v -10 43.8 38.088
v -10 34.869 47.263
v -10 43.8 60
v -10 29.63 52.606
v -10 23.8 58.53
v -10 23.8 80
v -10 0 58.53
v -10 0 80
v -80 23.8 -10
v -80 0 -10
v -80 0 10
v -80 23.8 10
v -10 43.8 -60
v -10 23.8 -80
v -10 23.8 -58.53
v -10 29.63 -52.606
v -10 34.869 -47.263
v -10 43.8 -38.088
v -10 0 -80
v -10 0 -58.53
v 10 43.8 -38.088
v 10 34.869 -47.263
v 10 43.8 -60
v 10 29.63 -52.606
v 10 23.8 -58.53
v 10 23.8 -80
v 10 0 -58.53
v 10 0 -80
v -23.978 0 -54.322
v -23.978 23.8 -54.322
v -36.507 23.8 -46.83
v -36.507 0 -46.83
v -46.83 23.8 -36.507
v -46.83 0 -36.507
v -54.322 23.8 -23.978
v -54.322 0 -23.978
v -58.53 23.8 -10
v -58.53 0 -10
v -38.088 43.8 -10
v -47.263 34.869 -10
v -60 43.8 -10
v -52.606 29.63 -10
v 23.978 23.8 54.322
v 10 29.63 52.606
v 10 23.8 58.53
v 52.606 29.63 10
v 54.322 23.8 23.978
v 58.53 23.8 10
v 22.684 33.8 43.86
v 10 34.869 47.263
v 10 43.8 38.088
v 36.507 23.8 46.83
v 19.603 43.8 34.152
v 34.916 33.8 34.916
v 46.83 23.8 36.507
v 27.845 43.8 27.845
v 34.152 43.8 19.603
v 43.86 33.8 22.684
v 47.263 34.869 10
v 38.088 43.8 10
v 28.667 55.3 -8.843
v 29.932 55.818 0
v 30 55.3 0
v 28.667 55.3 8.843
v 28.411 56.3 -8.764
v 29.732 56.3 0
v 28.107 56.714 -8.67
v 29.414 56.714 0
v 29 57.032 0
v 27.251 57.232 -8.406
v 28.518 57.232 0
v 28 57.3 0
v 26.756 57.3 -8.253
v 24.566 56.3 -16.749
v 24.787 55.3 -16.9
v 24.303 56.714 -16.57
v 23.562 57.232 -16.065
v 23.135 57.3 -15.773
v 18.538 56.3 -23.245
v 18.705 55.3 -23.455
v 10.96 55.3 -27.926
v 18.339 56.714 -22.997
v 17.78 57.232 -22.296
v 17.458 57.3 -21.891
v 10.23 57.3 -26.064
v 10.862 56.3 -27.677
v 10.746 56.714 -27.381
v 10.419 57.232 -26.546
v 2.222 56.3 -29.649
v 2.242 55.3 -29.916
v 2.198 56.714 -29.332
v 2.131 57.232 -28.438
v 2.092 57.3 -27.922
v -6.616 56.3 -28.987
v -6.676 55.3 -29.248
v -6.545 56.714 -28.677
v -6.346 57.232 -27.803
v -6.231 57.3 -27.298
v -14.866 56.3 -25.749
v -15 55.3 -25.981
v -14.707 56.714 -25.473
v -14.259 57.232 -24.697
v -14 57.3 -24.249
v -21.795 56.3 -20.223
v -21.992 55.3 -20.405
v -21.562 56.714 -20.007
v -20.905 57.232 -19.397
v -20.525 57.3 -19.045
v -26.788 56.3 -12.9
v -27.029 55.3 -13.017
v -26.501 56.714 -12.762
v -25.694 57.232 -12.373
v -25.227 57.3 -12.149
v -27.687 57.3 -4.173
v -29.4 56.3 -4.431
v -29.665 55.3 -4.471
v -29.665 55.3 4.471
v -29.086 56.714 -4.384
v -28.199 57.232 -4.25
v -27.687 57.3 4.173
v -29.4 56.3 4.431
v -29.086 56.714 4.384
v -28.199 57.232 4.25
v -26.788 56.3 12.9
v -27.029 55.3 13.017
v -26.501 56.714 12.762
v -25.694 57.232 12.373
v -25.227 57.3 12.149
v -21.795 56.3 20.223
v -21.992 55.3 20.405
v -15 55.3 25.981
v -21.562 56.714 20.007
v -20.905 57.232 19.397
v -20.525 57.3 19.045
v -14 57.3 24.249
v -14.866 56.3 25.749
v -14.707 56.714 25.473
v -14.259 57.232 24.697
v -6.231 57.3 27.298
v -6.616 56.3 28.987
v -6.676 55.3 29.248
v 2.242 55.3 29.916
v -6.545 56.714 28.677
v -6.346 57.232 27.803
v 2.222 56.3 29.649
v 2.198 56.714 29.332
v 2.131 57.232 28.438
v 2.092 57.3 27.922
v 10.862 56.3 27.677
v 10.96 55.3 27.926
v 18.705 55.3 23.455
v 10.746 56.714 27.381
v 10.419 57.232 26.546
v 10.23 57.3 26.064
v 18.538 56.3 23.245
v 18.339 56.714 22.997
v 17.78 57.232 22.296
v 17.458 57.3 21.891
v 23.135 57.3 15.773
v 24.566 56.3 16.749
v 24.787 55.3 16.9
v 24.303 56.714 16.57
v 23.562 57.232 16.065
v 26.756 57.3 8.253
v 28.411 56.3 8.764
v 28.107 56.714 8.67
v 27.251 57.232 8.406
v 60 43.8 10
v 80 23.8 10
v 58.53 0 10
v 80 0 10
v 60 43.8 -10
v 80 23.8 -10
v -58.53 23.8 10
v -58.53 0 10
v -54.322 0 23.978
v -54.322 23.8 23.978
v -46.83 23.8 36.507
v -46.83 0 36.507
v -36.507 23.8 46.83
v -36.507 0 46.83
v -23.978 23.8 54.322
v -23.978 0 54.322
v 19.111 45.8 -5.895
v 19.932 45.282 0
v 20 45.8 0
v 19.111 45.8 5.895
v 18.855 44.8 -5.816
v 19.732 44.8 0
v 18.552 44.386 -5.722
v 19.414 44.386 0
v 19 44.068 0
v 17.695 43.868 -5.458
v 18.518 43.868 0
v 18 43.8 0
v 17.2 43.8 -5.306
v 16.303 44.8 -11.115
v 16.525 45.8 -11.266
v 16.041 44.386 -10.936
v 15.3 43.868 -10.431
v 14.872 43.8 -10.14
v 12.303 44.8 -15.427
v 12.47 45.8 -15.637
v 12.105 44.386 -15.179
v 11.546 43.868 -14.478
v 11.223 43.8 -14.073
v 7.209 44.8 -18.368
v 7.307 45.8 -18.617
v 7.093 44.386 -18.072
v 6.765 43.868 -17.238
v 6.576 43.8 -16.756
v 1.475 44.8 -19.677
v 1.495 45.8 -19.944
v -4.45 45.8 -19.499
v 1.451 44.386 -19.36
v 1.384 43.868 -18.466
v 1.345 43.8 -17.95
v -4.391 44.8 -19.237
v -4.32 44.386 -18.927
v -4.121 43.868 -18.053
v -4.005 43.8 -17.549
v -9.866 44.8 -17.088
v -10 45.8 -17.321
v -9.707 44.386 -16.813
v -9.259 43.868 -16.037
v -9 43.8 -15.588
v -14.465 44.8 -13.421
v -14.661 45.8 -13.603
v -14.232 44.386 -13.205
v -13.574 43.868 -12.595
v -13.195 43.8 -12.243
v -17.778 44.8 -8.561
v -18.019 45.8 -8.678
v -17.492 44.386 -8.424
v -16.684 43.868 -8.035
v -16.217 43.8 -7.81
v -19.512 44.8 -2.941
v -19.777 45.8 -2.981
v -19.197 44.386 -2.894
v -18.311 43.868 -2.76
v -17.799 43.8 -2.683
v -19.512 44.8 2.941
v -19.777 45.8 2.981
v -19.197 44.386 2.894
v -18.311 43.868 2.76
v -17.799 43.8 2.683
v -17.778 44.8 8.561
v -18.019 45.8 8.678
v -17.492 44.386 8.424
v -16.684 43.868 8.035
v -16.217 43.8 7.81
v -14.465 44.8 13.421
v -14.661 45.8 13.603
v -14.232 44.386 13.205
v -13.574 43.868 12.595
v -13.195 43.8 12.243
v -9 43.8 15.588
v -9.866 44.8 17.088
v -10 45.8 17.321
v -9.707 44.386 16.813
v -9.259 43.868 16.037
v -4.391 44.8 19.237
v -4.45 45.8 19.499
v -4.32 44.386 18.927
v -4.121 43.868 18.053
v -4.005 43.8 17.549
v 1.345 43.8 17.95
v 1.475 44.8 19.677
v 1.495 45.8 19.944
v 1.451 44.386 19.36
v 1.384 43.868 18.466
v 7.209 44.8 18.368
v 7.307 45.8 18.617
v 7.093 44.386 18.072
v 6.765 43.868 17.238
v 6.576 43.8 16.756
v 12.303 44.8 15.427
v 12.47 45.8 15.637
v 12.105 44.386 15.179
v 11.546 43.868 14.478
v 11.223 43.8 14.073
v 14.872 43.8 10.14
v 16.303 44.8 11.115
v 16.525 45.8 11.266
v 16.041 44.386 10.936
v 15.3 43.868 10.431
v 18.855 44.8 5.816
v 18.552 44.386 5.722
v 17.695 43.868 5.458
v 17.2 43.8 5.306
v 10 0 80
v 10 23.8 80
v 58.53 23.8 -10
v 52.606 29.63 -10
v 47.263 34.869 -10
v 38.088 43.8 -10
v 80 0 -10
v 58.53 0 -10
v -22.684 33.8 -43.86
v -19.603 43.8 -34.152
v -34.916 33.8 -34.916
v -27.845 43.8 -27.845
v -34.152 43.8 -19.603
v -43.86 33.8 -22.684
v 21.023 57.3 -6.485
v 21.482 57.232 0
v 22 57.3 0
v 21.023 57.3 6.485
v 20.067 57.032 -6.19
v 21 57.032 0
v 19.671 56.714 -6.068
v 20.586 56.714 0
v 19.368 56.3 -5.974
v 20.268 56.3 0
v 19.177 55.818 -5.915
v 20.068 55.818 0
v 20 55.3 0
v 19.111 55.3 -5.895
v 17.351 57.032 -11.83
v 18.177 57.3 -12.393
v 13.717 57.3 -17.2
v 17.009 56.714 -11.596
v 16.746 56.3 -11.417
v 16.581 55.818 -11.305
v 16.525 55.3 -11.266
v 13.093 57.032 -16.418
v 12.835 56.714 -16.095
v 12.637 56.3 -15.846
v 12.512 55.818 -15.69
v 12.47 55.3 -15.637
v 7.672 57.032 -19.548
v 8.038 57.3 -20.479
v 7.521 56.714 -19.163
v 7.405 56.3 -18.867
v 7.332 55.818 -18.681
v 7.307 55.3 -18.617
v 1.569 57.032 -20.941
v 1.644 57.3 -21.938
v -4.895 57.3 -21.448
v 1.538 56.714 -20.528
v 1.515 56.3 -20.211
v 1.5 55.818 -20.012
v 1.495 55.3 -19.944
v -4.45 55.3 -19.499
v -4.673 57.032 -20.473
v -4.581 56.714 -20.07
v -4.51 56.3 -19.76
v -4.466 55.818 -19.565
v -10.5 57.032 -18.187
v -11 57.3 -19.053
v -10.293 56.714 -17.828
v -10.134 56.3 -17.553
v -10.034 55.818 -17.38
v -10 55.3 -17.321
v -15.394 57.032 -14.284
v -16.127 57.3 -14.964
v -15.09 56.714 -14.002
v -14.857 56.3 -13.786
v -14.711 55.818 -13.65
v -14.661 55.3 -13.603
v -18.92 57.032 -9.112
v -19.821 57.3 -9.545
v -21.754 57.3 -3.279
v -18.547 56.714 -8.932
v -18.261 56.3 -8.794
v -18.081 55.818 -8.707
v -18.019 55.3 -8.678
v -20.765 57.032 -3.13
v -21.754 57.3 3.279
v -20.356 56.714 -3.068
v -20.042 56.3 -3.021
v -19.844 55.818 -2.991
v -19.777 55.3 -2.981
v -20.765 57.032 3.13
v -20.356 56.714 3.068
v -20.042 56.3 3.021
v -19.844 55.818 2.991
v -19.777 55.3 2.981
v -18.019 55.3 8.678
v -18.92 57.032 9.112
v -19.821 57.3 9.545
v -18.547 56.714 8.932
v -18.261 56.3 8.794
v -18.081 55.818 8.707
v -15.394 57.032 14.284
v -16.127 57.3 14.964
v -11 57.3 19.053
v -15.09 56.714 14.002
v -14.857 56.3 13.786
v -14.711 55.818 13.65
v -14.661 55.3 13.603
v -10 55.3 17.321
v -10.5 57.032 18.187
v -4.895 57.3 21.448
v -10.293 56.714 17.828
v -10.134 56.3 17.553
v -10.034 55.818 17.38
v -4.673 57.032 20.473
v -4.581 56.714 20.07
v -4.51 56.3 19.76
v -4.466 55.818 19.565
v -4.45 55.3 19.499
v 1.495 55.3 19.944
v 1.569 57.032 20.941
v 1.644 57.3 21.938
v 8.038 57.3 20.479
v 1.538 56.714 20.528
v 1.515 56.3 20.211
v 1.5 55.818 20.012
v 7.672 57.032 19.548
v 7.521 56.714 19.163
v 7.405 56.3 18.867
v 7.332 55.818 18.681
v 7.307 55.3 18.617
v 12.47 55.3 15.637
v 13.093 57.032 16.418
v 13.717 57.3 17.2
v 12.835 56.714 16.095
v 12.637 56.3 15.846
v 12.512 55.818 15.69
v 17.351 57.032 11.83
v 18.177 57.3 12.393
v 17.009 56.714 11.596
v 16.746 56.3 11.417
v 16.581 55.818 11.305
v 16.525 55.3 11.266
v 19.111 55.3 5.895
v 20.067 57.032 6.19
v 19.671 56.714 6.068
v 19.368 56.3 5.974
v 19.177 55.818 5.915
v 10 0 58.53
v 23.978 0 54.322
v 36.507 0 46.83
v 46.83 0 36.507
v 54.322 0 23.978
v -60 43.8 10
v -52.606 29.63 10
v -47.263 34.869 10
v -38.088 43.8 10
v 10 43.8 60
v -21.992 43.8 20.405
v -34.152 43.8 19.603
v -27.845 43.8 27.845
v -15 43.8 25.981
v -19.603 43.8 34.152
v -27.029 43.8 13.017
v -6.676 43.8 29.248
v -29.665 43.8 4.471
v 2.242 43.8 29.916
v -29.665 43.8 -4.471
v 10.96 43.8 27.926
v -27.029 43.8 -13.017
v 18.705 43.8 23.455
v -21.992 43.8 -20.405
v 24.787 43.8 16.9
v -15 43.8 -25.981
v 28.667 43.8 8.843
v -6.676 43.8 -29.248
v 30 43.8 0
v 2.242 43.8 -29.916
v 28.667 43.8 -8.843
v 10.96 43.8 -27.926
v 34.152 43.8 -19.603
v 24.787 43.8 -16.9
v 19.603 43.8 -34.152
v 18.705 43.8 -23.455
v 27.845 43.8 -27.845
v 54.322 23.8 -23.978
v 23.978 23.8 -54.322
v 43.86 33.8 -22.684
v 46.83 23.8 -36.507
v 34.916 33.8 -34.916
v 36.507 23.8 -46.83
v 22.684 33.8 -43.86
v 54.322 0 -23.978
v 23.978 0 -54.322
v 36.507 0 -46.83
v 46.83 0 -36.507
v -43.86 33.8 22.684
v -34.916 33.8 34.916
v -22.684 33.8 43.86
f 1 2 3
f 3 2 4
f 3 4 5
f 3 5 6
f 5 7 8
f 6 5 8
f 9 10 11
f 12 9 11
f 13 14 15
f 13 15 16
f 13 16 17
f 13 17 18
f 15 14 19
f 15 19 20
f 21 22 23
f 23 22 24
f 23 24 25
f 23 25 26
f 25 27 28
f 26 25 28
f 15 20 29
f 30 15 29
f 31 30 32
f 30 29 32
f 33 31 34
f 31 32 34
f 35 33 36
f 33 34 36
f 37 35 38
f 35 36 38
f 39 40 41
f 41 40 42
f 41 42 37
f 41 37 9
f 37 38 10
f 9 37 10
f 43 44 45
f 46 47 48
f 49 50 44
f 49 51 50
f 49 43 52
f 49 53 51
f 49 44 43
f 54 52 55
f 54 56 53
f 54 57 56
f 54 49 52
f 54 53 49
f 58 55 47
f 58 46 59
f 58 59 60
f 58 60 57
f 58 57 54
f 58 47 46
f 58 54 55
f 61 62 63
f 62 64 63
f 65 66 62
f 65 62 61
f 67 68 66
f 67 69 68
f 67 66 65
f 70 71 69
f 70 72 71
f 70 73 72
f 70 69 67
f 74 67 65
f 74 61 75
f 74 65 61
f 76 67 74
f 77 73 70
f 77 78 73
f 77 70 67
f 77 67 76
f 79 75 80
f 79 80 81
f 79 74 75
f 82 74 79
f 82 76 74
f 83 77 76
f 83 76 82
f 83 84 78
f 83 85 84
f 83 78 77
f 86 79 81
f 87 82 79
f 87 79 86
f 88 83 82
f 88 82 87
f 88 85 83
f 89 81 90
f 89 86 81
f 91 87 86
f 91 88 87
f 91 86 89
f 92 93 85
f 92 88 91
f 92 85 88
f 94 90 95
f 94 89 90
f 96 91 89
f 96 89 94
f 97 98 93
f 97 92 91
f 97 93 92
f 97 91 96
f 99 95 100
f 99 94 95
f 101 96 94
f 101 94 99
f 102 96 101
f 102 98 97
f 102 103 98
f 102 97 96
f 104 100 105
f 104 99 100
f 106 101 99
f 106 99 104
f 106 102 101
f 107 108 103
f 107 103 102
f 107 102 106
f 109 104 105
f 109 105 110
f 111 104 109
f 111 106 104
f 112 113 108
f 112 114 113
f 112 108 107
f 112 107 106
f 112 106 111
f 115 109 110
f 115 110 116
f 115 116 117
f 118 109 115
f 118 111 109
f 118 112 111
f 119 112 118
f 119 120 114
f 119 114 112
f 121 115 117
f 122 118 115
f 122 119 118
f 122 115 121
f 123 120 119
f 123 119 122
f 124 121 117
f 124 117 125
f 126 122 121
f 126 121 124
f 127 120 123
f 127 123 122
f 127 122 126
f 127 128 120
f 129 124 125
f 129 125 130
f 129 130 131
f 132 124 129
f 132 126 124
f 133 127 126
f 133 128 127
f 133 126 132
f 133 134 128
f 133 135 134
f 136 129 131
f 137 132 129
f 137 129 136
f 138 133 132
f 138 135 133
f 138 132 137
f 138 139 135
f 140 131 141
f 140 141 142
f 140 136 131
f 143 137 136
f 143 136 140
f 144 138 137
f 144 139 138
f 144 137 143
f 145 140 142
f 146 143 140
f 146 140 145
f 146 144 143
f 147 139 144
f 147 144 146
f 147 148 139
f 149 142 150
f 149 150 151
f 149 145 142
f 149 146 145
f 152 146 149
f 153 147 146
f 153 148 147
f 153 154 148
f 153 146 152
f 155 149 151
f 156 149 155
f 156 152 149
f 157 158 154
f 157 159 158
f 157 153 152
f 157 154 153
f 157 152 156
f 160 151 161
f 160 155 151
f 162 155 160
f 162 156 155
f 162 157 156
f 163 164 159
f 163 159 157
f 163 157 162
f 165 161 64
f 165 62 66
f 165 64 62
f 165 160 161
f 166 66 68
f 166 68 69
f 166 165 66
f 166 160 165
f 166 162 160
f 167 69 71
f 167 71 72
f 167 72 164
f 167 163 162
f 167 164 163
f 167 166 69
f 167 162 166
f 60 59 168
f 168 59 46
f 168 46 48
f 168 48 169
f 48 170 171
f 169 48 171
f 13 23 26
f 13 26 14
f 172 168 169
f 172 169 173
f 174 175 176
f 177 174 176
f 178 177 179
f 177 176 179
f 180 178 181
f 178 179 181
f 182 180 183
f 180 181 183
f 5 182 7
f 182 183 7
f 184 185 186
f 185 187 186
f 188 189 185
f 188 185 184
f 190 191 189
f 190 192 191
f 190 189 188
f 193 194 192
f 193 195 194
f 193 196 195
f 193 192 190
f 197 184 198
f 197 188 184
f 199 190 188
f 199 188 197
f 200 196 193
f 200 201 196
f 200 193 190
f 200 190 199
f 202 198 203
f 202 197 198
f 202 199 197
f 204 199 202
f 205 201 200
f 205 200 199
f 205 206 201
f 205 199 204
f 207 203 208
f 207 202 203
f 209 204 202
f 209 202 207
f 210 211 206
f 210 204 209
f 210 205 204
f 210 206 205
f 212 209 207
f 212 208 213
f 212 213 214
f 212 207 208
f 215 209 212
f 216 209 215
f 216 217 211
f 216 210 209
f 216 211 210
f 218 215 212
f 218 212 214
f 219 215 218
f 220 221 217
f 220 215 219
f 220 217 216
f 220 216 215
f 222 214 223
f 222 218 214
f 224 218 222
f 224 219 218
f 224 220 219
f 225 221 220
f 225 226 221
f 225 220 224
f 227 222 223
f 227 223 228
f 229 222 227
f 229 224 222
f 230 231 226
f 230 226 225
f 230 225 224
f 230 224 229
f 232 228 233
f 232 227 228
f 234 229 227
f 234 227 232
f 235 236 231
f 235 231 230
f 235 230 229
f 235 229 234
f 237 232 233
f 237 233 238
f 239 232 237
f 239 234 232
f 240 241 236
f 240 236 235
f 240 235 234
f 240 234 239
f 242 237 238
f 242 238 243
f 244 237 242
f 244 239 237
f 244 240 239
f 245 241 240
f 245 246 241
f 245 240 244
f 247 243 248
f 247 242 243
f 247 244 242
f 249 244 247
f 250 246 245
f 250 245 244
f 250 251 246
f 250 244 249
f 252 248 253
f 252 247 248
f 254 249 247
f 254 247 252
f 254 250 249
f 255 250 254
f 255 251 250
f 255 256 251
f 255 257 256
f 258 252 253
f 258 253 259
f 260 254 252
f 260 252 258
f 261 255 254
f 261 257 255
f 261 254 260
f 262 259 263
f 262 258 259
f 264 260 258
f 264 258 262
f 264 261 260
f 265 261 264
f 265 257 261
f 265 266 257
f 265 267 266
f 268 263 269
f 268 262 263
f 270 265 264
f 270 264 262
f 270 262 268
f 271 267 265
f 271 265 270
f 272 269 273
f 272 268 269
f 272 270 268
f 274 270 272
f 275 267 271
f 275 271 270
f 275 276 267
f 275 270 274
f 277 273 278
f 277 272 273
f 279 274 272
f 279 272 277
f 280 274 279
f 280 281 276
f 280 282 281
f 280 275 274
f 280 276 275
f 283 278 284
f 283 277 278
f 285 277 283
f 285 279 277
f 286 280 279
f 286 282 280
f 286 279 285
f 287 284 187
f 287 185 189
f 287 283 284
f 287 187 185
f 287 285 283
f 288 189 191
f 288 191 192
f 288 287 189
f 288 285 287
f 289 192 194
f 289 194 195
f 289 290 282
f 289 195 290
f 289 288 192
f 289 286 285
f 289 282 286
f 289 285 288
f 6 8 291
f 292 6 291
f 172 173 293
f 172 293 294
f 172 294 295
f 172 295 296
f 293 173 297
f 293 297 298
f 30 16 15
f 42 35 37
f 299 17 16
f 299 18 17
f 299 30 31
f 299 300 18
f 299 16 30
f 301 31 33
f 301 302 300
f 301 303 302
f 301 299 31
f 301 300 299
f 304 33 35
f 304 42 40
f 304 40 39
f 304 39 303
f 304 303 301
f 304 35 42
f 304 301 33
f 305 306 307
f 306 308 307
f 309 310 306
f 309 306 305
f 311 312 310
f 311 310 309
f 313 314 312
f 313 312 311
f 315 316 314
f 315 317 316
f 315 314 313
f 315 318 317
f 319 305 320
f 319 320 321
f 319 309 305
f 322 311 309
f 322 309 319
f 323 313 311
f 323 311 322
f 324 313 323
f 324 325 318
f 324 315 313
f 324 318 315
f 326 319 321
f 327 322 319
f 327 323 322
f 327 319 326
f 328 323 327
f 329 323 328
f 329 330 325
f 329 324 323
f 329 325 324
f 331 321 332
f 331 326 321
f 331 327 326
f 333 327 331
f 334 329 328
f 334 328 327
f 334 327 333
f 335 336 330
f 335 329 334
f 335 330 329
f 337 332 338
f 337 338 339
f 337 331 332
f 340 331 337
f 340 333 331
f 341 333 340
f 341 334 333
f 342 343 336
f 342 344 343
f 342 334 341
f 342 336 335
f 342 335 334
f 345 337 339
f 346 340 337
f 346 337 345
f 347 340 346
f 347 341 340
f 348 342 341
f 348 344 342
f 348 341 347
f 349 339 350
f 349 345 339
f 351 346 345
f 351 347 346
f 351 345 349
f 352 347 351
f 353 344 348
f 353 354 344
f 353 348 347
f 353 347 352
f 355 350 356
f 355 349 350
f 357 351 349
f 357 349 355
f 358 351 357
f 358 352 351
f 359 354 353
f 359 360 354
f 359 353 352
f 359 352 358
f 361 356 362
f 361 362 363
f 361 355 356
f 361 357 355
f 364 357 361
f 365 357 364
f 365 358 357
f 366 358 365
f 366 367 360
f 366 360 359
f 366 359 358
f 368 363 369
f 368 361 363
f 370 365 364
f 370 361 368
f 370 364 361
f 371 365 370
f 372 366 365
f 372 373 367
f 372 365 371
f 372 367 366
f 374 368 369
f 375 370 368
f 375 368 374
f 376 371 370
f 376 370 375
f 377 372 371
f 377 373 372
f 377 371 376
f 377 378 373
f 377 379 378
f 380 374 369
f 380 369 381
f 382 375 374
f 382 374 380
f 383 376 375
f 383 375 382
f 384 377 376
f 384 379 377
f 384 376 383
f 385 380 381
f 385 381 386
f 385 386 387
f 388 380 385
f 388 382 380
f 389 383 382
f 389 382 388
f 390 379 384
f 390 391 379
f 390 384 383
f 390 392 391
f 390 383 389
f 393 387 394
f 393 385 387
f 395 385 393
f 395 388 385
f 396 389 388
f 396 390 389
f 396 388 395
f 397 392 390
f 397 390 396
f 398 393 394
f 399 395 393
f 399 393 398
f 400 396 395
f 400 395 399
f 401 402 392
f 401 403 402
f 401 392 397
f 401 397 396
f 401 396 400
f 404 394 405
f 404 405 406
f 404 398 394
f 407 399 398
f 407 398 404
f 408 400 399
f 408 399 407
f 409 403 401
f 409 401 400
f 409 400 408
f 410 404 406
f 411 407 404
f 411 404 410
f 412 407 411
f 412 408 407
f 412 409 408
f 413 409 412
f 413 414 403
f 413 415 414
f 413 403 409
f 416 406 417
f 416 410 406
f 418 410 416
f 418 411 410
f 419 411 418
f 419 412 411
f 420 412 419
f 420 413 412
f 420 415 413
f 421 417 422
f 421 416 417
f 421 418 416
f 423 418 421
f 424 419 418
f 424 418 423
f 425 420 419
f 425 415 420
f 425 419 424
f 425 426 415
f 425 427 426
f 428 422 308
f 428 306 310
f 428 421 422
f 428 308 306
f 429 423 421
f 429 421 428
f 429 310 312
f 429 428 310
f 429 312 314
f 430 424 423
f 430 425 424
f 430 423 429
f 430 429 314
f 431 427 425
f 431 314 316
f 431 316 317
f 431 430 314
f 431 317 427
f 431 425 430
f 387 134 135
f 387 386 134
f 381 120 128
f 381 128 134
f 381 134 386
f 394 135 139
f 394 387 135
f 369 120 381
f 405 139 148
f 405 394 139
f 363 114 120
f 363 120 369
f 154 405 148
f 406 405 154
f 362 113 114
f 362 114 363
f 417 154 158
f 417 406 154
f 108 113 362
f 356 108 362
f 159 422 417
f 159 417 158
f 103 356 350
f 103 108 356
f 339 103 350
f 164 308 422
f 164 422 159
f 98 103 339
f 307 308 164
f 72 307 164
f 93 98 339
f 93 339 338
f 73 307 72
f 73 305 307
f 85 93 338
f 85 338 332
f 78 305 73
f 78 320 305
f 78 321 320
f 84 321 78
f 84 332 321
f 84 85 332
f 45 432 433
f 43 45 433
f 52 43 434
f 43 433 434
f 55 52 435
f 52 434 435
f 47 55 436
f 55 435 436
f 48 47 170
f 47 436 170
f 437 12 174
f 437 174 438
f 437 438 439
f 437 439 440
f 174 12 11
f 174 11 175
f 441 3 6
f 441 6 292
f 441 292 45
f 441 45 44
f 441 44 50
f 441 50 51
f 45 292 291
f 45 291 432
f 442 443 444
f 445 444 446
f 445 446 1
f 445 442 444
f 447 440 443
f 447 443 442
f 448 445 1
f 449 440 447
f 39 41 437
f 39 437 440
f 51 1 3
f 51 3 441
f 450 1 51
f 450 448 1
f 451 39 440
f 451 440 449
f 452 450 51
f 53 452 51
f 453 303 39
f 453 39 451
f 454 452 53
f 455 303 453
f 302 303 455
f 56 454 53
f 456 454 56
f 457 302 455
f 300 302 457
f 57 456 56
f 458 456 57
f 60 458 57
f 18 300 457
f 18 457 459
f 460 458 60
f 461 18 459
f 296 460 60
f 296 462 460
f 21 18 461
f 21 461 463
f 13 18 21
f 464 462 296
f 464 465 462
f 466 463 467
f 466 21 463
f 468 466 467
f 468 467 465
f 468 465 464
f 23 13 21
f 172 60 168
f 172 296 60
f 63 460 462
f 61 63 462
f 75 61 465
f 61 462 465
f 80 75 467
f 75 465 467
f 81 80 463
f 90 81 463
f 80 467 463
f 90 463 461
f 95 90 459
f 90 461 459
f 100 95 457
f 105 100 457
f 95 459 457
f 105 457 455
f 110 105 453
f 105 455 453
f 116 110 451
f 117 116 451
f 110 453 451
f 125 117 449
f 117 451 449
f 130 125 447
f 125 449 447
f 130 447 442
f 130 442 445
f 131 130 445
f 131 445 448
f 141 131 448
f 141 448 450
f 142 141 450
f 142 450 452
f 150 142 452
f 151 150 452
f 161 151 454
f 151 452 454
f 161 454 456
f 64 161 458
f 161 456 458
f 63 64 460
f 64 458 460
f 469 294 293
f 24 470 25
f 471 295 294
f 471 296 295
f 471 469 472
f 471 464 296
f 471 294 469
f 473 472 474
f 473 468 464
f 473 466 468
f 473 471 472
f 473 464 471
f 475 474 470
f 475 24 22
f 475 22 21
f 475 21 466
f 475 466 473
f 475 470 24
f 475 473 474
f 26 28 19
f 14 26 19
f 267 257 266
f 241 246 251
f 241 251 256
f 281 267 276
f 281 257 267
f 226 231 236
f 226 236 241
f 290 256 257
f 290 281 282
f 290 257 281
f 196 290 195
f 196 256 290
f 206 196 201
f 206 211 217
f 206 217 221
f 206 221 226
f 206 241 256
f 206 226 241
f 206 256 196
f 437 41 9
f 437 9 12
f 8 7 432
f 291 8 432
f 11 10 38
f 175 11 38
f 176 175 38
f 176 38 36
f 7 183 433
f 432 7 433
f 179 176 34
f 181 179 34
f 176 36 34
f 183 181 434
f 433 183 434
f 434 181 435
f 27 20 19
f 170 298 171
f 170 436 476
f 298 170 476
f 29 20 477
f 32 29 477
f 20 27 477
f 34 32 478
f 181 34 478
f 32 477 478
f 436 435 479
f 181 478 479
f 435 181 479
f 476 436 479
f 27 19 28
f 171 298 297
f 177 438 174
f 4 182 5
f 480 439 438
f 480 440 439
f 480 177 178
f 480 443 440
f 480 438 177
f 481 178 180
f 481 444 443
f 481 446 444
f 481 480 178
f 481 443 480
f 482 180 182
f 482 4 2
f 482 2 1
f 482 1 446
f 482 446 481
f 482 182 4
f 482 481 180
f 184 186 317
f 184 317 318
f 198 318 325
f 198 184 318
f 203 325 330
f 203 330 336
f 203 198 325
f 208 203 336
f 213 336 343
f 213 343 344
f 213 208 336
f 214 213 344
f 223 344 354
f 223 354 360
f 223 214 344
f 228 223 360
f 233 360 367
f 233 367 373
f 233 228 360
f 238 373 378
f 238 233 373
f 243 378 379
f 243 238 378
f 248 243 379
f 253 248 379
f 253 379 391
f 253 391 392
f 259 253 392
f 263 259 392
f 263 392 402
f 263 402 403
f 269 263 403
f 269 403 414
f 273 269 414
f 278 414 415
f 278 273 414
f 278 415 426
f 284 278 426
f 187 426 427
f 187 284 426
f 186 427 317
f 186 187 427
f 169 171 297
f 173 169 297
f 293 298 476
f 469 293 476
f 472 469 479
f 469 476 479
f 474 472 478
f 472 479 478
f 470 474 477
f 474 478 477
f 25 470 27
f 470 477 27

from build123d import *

# Parameters (mm, degrees)
SALIENTE_EXTRUIR1_DEPTH = 43.8
CHAFL_N1_SIZE           = 20
CROQUIS2_R              = 30
CROQUIS2_R_2            = 20
SALIENTE_EXTRUIR2_DEPTH = 13.5
REDONDEO1_R             = 2


with BuildPart() as part:
    # Croquis1 → Saliente-Extruir1 (new body)
    with BuildSketch(Plane(origin=(0, 0, 0), x_dir=(1, 0, 0), z_dir=(0, 1, 0))):
        with BuildLine():
            Line((-10, -58.530413525), (-10, -80))
            Line((-10, -80), (10, -80))
            Line((10, -80), (10, -58.530413525))
            ThreePointArc((10, -58.530413525), (41.986958138, -41.986958138), (58.530413525, -10))
            Line((58.530413525, -10), (80, -10))
            Line((80, -10), (80, 10))
            Line((80, 10), (58.530413525, 10))
            ThreePointArc((58.530413525, 10), (41.986958138, 41.986958138), (10, 58.530413525))
            Line((10, 58.530413525), (10, 80))
            Line((10, 80), (-10, 80))
            Line((-10, 80), (-10, 58.530413525))
            ThreePointArc((-10, 58.530413525), (-41.986958138, 41.986958138), (-58.530413525, 10))
            Line((-58.530413525, 10), (-80, 10))
            Line((-80, 10), (-80, -10))
            Line((-80, -10), (-58.530413525, -10))
            ThreePointArc((-58.530413525, -10), (-41.986958138, -41.986958138), (-10, -58.530413525))
        make_face()
    extrude(amount=SALIENTE_EXTRUIR1_DEPTH)

    # Chaflán1
    chafl_n1_edges = [part.edges().sort_by_distance(p)[0] for p in [
        (-80, 43.8, 0),
        (-41.986958138, 43.8, 41.986958138),
        (0, 43.8, 80),
        (41.986958138, 43.8, 41.986958138),
        (80, 43.8, 0),
        (41.986958138, 43.8, -41.986958138),
        (0, 43.8, -80),
        (-41.986958138, 43.8, -41.986958138),
    ]]
    chamfer(chafl_n1_edges, length=CHAFL_N1_SIZE)

    # Croquis2 → Saliente-Extruir2 (add)
    with BuildSketch(Plane(origin=(0, 43.8, 0), x_dir=(1, 0, 0), z_dir=(0, 1, 0))):
        Circle(CROQUIS2_R)
        Circle(CROQUIS2_R_2, mode=Mode.SUBTRACT)
    extrude(amount=SALIENTE_EXTRUIR2_DEPTH)

    # Redondeo1
    redondeo1_edges = [part.edges().sort_by_distance(p)[0] for p in [
        (-20, 43.8, 0),
        (-30, 57.3, 0),
        (-20, 57.3, 0),
    ]]
    fillet(redondeo1_edges, radius=REDONDEO1_R)


solid = part.part
